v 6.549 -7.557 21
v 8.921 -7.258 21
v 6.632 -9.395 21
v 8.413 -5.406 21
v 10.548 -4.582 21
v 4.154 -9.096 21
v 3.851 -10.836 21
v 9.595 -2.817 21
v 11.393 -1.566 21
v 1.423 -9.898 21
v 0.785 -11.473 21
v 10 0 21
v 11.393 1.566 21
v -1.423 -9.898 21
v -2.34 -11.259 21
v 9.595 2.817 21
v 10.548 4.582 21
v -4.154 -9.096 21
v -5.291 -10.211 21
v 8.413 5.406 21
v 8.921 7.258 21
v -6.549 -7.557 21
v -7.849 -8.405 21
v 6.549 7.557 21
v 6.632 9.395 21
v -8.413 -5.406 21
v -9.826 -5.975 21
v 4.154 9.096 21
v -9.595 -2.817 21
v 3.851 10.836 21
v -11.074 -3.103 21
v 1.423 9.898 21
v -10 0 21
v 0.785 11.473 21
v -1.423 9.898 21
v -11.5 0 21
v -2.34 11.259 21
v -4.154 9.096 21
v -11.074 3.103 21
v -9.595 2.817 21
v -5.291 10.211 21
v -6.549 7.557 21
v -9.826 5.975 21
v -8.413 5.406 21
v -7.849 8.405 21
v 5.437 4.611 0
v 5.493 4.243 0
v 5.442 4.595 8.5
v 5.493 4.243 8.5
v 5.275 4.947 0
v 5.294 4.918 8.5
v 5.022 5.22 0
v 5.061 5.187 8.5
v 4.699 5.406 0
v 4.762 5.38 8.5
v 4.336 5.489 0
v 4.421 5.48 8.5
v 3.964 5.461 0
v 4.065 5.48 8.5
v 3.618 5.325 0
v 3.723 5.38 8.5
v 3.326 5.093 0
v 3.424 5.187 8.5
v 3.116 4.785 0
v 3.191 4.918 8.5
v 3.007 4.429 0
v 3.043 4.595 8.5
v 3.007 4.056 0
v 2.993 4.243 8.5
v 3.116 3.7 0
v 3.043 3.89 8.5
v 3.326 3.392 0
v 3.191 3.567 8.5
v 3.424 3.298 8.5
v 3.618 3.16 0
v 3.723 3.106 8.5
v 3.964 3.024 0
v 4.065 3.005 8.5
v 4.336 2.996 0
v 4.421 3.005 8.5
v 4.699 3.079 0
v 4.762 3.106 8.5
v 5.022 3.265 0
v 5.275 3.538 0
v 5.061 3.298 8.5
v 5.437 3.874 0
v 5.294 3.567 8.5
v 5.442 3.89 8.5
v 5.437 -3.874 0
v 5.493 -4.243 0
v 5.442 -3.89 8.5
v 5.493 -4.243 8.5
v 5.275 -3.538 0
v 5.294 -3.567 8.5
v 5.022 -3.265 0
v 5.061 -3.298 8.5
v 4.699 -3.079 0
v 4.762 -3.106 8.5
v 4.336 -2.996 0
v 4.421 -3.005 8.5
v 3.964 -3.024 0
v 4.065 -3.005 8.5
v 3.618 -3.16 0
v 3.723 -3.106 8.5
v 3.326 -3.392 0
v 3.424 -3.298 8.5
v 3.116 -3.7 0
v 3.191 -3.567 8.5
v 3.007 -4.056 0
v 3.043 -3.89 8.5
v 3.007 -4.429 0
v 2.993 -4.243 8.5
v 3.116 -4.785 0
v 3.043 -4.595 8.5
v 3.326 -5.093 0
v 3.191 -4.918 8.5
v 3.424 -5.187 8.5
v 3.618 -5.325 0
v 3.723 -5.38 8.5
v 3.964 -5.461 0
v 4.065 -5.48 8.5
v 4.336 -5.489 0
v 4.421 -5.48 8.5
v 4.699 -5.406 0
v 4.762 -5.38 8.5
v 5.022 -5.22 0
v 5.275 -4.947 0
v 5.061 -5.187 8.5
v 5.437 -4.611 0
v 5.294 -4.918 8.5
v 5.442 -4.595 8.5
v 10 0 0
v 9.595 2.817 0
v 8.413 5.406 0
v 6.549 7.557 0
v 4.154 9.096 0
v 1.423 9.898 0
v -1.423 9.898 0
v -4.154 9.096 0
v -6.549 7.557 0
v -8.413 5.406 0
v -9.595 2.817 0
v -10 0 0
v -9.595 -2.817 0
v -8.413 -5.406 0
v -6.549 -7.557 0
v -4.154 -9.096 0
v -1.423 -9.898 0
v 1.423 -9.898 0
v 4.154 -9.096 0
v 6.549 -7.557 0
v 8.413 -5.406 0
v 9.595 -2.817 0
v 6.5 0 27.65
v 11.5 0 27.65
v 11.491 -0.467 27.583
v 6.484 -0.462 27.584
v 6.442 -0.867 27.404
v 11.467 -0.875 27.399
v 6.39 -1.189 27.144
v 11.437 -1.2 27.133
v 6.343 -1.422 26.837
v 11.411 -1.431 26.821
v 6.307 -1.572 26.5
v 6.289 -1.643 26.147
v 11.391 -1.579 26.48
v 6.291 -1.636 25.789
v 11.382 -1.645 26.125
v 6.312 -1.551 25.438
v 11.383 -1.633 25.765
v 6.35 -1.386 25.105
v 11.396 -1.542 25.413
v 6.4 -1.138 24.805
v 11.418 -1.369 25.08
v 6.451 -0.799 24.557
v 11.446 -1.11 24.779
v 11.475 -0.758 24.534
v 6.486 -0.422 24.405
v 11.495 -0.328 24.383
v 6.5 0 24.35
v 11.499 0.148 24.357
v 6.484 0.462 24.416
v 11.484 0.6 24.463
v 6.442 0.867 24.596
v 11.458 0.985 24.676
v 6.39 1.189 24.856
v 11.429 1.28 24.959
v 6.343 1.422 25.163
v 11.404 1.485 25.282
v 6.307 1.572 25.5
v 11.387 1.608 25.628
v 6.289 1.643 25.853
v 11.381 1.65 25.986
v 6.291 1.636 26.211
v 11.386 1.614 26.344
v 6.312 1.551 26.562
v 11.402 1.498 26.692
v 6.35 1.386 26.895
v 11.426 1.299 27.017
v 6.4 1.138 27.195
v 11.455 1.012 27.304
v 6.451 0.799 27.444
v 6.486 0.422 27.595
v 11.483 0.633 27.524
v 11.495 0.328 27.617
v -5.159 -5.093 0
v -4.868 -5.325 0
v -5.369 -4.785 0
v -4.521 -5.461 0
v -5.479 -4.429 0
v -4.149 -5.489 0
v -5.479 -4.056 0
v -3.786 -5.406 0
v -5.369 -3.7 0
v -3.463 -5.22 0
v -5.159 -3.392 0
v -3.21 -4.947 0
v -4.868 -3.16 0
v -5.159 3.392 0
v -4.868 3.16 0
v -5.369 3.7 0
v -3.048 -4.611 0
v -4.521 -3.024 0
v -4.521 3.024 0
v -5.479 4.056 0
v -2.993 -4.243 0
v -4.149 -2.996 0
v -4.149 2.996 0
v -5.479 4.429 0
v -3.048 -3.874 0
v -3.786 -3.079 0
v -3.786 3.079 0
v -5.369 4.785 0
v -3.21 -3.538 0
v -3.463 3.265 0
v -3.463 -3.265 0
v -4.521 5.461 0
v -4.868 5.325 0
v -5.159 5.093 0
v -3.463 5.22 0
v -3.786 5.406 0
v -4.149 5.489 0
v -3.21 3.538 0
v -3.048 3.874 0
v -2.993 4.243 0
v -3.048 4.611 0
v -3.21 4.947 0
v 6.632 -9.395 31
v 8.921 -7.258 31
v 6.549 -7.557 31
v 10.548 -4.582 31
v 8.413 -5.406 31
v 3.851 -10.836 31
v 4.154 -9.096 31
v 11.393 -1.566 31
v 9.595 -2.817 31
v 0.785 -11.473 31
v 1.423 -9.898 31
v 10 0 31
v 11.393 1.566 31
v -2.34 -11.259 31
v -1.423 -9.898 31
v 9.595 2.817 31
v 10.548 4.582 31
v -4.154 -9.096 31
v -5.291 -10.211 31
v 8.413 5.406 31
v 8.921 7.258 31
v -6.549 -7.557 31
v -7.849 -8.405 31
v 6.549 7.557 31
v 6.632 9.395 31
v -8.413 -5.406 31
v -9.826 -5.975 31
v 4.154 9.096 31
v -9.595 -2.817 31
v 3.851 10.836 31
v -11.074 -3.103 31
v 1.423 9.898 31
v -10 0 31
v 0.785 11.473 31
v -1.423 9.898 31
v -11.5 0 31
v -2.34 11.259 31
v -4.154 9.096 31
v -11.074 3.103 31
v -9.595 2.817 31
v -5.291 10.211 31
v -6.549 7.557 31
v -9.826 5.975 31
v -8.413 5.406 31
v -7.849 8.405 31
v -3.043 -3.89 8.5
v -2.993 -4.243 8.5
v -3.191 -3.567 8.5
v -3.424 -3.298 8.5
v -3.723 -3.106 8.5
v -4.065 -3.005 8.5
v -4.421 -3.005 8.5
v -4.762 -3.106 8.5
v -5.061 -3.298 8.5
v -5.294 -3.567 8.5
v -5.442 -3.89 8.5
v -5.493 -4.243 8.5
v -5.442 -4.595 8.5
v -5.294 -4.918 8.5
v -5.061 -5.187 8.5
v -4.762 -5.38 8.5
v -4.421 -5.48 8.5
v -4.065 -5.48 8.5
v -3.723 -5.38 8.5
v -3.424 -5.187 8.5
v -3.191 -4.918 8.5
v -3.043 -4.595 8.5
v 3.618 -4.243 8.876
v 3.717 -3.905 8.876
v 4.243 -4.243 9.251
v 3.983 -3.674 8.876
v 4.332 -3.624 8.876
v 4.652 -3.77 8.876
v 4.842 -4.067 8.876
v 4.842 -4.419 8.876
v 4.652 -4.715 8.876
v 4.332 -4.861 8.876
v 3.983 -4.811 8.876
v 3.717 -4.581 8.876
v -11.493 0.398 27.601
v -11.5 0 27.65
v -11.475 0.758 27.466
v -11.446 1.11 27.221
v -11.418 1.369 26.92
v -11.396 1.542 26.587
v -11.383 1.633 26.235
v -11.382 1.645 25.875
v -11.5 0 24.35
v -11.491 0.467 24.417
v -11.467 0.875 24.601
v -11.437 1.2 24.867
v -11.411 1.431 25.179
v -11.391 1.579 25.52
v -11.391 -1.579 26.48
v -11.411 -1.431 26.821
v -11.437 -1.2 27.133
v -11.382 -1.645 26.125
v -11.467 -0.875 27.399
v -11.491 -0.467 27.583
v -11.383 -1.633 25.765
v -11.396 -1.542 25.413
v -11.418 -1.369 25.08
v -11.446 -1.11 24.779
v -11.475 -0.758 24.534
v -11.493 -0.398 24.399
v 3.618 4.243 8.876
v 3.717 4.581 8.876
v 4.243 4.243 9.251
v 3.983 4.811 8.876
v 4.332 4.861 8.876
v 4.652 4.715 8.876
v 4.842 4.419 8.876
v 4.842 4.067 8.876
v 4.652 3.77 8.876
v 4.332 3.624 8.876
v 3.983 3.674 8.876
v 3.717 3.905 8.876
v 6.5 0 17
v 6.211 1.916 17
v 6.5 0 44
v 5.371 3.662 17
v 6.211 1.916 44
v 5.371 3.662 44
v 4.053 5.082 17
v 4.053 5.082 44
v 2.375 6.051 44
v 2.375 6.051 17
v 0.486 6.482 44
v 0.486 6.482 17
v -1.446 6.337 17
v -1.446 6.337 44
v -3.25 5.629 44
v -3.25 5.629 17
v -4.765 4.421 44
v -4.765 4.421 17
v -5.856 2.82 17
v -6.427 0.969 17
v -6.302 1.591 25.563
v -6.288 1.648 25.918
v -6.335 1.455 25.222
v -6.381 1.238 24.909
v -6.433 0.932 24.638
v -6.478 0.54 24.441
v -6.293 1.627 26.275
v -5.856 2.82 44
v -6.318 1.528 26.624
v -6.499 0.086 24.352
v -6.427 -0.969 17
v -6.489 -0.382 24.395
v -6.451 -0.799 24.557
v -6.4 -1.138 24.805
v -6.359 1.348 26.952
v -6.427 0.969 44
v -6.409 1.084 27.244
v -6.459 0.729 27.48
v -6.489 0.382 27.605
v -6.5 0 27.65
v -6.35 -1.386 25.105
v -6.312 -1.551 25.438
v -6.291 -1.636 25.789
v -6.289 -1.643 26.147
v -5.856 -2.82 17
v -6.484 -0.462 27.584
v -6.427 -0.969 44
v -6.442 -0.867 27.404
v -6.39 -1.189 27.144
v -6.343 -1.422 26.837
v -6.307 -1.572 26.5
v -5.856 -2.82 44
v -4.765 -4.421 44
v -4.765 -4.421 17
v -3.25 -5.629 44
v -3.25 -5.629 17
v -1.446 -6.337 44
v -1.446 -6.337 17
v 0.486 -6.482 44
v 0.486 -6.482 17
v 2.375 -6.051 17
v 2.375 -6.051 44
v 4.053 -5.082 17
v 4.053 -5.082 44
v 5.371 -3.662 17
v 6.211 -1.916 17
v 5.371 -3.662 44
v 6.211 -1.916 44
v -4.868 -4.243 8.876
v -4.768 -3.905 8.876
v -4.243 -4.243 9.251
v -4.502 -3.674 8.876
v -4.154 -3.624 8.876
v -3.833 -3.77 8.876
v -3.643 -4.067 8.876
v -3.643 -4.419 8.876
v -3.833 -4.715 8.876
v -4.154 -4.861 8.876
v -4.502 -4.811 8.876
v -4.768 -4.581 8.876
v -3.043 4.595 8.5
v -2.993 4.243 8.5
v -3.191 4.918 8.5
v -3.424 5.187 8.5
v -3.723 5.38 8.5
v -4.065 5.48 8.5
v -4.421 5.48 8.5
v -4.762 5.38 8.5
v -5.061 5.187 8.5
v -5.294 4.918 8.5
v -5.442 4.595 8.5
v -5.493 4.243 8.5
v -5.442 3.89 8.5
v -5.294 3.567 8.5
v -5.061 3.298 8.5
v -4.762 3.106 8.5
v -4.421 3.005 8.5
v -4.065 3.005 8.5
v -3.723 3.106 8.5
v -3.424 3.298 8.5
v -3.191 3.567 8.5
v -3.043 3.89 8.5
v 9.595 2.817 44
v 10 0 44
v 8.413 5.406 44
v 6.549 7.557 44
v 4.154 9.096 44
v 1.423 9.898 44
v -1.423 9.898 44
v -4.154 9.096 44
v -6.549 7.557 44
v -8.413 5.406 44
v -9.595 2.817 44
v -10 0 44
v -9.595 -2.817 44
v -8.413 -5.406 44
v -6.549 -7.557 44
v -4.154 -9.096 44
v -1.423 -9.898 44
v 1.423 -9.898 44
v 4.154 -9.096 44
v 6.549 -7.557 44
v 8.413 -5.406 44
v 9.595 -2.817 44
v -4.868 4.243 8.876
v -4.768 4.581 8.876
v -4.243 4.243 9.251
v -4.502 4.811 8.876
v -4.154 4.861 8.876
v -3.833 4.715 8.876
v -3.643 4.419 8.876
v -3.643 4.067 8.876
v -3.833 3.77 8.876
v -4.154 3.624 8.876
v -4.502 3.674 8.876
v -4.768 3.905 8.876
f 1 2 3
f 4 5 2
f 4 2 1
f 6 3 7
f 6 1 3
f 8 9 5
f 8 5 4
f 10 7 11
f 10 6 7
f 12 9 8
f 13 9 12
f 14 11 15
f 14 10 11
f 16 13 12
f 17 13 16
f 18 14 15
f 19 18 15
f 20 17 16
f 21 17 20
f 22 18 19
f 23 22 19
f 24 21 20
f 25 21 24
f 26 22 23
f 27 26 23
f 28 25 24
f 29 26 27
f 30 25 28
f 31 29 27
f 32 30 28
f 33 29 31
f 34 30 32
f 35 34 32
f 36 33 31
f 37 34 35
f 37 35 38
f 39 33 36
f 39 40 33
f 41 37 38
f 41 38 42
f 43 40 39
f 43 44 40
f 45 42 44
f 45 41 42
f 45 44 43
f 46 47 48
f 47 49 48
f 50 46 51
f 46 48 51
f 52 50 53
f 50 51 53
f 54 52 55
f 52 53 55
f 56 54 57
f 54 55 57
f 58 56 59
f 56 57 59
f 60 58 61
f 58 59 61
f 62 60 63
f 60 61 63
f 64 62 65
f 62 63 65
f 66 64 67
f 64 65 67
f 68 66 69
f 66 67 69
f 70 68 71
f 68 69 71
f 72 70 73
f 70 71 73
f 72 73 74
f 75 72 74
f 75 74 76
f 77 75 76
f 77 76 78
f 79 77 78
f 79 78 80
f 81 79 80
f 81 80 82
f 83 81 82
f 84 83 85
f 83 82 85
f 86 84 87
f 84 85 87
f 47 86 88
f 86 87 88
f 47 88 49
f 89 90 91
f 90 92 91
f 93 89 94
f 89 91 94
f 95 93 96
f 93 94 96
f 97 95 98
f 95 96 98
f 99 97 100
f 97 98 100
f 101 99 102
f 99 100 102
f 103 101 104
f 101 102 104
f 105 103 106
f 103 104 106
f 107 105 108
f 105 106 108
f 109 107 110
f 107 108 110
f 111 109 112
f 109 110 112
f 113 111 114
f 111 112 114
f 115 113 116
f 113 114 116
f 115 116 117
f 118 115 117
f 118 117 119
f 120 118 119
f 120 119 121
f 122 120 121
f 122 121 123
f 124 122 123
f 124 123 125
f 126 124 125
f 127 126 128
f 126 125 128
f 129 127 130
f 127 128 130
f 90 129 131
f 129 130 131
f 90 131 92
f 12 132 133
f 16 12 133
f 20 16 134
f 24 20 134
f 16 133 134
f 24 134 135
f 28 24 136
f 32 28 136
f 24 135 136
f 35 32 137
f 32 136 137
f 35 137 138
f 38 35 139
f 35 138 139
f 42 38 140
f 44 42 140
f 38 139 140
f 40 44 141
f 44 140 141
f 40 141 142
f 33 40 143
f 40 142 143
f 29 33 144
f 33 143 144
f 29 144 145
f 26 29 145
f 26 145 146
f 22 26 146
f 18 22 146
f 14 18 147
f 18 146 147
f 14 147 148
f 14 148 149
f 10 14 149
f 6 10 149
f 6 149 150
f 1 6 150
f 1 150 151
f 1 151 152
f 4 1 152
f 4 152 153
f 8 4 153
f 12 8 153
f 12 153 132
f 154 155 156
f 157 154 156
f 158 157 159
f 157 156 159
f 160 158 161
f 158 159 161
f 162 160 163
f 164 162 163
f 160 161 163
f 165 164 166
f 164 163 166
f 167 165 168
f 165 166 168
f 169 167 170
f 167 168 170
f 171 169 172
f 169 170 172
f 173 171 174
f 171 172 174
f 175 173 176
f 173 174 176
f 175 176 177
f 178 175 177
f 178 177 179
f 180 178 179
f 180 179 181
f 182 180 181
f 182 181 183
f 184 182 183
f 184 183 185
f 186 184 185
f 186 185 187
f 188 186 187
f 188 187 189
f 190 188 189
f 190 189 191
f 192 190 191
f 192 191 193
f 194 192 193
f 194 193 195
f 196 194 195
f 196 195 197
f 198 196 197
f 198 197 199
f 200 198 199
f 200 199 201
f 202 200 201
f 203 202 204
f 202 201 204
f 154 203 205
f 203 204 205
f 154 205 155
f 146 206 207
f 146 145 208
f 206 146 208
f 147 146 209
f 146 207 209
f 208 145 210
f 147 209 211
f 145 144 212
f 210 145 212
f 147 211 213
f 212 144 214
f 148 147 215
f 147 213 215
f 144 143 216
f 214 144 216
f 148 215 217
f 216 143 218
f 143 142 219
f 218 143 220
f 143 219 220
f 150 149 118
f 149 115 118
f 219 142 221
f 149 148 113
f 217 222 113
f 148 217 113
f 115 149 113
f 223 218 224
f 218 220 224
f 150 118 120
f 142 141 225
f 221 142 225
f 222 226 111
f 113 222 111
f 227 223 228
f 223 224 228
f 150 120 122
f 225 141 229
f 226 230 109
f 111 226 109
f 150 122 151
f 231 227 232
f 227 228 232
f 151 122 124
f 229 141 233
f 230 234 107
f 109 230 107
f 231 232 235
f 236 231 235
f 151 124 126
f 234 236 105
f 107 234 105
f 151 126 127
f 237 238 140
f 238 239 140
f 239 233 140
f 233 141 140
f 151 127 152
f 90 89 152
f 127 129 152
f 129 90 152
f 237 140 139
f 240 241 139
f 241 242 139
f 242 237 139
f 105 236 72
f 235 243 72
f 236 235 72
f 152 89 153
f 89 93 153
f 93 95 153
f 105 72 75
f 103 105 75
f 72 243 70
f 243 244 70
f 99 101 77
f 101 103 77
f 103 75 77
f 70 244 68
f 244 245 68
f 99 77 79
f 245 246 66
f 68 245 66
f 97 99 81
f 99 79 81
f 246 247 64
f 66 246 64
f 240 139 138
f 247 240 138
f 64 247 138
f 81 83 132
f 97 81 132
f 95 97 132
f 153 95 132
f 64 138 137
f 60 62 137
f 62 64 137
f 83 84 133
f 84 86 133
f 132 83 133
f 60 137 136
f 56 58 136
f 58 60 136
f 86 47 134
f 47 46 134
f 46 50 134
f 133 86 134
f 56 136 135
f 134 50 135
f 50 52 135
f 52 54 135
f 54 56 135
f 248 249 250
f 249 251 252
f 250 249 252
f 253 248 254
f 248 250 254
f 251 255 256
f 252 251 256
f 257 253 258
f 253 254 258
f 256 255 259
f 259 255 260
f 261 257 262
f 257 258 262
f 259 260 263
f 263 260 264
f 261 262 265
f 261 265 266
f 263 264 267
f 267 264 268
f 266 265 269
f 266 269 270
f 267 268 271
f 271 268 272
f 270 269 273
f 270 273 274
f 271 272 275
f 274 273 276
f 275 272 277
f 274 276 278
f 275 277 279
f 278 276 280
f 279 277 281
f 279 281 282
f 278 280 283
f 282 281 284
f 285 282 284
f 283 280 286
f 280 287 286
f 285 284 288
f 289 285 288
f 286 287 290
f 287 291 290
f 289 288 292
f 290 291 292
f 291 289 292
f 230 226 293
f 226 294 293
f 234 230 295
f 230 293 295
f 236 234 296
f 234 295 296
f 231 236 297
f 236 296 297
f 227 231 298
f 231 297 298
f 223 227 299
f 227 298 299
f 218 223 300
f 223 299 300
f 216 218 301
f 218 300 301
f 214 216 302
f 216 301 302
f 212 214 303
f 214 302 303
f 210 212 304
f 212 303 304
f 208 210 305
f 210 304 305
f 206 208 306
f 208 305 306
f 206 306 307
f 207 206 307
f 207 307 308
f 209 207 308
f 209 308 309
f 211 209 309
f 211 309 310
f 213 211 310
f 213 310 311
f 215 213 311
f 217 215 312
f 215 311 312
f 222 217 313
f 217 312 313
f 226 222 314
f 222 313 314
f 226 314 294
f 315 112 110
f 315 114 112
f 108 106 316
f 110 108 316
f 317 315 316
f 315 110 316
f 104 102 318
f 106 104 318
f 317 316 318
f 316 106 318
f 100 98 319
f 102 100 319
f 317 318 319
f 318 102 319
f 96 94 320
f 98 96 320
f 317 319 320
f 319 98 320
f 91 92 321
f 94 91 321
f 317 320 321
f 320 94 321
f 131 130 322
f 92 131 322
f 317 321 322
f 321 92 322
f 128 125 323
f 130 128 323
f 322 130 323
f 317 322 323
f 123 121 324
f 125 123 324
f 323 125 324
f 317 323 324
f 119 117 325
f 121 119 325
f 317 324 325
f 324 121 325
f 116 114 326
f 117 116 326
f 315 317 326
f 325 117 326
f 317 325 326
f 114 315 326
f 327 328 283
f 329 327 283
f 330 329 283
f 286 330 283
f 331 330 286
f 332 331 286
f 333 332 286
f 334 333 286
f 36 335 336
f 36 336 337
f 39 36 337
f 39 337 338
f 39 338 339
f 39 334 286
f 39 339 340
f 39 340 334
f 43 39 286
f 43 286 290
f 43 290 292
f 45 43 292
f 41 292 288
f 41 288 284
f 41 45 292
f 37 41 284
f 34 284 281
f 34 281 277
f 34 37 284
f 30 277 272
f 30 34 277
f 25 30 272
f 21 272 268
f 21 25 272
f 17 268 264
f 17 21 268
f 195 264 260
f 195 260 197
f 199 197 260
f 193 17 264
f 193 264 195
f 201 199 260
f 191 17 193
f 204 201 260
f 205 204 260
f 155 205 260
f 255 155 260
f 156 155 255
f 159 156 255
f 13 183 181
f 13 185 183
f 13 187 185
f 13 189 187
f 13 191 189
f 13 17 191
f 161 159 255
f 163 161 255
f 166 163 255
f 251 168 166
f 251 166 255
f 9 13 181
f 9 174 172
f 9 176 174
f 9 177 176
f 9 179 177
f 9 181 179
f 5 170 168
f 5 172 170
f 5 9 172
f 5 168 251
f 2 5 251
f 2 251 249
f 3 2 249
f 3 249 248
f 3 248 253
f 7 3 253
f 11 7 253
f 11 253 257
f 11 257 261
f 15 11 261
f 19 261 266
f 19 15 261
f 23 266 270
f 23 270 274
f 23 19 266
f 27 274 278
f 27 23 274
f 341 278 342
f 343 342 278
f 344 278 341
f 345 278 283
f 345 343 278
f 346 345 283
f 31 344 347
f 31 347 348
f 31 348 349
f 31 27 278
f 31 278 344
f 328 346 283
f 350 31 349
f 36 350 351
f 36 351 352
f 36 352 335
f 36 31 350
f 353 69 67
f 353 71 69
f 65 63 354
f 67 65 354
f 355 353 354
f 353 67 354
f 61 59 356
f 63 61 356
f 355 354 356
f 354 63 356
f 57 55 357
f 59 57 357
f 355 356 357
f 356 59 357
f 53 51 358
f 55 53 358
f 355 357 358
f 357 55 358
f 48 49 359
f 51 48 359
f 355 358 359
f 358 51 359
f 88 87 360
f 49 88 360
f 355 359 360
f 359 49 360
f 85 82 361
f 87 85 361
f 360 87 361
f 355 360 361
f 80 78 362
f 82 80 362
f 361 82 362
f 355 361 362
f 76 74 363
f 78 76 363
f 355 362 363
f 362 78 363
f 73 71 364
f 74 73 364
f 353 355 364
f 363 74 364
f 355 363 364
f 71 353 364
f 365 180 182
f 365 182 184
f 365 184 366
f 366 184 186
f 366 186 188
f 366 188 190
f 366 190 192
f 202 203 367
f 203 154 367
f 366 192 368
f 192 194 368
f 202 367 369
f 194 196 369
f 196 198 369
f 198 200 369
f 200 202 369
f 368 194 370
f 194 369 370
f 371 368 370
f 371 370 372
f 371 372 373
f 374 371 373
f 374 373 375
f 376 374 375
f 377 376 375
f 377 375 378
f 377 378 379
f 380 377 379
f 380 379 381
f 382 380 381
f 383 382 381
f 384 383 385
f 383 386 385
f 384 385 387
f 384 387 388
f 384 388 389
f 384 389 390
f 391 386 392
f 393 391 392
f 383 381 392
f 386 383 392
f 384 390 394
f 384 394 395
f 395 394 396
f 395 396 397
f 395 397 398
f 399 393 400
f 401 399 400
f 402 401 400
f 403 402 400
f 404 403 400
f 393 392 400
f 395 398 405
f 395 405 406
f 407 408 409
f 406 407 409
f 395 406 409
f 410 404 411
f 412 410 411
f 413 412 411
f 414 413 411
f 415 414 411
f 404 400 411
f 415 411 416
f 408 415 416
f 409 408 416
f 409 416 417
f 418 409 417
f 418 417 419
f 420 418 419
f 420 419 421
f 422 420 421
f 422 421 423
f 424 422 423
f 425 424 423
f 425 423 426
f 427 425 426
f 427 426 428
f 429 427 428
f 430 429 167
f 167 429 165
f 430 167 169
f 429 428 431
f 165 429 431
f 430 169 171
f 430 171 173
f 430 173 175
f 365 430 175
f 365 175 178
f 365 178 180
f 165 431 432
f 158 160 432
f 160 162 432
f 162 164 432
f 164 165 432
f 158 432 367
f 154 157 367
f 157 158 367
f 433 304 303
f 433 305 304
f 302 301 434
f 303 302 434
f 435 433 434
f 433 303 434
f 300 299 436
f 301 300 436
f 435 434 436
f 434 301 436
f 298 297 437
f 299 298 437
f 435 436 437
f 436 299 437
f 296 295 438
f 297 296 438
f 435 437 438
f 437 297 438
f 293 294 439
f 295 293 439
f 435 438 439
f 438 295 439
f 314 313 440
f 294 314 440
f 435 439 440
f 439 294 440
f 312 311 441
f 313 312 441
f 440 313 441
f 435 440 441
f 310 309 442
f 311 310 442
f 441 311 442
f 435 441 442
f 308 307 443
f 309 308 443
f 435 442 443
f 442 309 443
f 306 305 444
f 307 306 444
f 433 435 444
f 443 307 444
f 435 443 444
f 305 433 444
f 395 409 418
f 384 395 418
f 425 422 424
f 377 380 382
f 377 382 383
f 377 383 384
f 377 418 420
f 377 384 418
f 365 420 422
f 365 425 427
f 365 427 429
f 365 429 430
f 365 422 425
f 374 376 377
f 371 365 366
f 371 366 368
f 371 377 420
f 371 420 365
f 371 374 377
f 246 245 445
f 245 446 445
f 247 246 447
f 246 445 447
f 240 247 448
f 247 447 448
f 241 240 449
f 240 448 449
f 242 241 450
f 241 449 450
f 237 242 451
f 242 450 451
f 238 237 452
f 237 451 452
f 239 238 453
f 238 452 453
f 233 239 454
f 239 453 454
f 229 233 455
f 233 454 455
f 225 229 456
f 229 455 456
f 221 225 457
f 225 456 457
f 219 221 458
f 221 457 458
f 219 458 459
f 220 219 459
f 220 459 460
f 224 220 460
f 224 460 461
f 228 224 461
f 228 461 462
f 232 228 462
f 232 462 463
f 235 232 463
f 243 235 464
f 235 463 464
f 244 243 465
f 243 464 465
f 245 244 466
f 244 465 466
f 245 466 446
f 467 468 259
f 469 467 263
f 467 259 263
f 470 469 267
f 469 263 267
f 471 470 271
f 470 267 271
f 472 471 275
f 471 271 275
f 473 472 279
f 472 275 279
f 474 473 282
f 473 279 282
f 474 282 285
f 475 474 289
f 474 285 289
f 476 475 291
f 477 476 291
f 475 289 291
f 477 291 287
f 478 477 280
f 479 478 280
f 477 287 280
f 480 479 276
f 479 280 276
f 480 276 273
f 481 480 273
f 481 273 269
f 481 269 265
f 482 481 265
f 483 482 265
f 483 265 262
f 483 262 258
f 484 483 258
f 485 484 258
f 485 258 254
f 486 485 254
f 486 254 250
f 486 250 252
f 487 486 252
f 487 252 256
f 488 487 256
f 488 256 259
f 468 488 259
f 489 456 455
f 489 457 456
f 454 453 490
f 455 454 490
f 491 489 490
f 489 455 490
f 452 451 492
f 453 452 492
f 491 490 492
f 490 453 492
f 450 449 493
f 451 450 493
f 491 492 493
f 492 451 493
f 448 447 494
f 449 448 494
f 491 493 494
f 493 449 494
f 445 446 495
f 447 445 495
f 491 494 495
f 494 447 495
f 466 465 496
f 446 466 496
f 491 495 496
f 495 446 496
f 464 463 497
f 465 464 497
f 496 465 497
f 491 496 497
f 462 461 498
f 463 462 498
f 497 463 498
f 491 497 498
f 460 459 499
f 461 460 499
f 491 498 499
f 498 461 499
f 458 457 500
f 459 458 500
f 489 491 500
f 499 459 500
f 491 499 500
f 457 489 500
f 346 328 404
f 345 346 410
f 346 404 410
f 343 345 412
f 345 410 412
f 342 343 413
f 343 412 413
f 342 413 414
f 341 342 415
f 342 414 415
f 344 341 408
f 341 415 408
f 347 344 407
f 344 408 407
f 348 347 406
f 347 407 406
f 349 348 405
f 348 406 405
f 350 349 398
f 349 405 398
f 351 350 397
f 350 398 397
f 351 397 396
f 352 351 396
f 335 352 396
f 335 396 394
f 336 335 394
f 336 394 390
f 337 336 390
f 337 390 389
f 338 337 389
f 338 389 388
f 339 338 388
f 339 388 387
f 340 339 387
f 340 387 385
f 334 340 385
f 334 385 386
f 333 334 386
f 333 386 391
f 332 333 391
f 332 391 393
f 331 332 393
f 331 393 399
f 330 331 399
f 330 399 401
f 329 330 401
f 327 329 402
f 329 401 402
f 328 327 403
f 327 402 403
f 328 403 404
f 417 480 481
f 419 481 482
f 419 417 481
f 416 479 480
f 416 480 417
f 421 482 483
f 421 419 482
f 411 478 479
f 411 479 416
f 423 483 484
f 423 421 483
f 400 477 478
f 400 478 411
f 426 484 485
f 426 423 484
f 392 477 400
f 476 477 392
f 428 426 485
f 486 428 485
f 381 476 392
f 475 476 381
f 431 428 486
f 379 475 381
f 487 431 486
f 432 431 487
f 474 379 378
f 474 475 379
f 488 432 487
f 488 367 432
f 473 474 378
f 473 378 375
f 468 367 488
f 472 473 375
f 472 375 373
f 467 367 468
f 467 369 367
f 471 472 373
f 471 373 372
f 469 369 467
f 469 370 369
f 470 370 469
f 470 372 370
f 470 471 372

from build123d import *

# Parameters (mm, degrees)
SKETCH_1_R          = 10
EXTRUDE_1_DEPTH     = 44
SKETCH_2_R          = 6.5
CUT_EXTRUDE_1_DEPTH = 27
M3X0_51_D           = 2.5
M3X0_51_DEPTH       = 8.5
M3X0_51_TIP         = 0.751075774
SKETCH_10_R         = 11.5
SKETCH_10_R_2       = 10
EXTRUDE_2_DEPTH     = 10
M4X0_71_D           = 3.3


with BuildPart() as part:
    # Эскиз1 → Бобышка-Вытянуть1 (new body)
    with BuildSketch(Plane.XY):
        Circle(SKETCH_1_R)
    extrude(amount=EXTRUDE_1_DEPTH)

    # Эскиз2 → Вырез-Вытянуть1 (cut)
    with BuildSketch(Plane.XY.offset(44)):
        Circle(SKETCH_2_R)
    extrude(amount=-CUT_EXTRUDE_1_DEPTH, mode=Mode.SUBTRACT)

    # Отверстие обработанное метчиком M3x0.51
    with Locations(Plane(origin=(0, 0, 0), x_dir=(-1, 0, 0), z_dir=(0, 0, -1))):
        with Locations((-4.242640687, 4.242640687), (4.242640687, 4.242640687), (4.242640687, -4.242640687), (-4.242640687, -4.242640687)):
            Hole(M3X0_51_D / 2, depth=M3X0_51_DEPTH)
            with Locations((0, 0, -(M3X0_51_DEPTH + M3X0_51_TIP / 2))):  # 118° drill point
                Cone(0, M3X0_51_D / 2, M3X0_51_TIP, mode=Mode.SUBTRACT)

    # Эскиз10 → Бобышка-Вытянуть2 (add)
    with BuildSketch(Plane(origin=(0, 0, 21), x_dir=(-1, 0, 0), z_dir=(0, 0, -1))):
        Circle(SKETCH_10_R)
        Circle(SKETCH_10_R_2, mode=Mode.SUBTRACT)
    extrude(amount=-EXTRUDE_2_DEPTH)

    # Отверстие обработанное метчиком M4x0.71 (through all)
    with Locations(Plane(origin=(-11.5, 0, 0), x_dir=(0, 0, -1), z_dir=(-1, 0, 0))):
        with Locations((-26, 0)):
            Hole(M4X0_71_D / 2)


solid = part.part
